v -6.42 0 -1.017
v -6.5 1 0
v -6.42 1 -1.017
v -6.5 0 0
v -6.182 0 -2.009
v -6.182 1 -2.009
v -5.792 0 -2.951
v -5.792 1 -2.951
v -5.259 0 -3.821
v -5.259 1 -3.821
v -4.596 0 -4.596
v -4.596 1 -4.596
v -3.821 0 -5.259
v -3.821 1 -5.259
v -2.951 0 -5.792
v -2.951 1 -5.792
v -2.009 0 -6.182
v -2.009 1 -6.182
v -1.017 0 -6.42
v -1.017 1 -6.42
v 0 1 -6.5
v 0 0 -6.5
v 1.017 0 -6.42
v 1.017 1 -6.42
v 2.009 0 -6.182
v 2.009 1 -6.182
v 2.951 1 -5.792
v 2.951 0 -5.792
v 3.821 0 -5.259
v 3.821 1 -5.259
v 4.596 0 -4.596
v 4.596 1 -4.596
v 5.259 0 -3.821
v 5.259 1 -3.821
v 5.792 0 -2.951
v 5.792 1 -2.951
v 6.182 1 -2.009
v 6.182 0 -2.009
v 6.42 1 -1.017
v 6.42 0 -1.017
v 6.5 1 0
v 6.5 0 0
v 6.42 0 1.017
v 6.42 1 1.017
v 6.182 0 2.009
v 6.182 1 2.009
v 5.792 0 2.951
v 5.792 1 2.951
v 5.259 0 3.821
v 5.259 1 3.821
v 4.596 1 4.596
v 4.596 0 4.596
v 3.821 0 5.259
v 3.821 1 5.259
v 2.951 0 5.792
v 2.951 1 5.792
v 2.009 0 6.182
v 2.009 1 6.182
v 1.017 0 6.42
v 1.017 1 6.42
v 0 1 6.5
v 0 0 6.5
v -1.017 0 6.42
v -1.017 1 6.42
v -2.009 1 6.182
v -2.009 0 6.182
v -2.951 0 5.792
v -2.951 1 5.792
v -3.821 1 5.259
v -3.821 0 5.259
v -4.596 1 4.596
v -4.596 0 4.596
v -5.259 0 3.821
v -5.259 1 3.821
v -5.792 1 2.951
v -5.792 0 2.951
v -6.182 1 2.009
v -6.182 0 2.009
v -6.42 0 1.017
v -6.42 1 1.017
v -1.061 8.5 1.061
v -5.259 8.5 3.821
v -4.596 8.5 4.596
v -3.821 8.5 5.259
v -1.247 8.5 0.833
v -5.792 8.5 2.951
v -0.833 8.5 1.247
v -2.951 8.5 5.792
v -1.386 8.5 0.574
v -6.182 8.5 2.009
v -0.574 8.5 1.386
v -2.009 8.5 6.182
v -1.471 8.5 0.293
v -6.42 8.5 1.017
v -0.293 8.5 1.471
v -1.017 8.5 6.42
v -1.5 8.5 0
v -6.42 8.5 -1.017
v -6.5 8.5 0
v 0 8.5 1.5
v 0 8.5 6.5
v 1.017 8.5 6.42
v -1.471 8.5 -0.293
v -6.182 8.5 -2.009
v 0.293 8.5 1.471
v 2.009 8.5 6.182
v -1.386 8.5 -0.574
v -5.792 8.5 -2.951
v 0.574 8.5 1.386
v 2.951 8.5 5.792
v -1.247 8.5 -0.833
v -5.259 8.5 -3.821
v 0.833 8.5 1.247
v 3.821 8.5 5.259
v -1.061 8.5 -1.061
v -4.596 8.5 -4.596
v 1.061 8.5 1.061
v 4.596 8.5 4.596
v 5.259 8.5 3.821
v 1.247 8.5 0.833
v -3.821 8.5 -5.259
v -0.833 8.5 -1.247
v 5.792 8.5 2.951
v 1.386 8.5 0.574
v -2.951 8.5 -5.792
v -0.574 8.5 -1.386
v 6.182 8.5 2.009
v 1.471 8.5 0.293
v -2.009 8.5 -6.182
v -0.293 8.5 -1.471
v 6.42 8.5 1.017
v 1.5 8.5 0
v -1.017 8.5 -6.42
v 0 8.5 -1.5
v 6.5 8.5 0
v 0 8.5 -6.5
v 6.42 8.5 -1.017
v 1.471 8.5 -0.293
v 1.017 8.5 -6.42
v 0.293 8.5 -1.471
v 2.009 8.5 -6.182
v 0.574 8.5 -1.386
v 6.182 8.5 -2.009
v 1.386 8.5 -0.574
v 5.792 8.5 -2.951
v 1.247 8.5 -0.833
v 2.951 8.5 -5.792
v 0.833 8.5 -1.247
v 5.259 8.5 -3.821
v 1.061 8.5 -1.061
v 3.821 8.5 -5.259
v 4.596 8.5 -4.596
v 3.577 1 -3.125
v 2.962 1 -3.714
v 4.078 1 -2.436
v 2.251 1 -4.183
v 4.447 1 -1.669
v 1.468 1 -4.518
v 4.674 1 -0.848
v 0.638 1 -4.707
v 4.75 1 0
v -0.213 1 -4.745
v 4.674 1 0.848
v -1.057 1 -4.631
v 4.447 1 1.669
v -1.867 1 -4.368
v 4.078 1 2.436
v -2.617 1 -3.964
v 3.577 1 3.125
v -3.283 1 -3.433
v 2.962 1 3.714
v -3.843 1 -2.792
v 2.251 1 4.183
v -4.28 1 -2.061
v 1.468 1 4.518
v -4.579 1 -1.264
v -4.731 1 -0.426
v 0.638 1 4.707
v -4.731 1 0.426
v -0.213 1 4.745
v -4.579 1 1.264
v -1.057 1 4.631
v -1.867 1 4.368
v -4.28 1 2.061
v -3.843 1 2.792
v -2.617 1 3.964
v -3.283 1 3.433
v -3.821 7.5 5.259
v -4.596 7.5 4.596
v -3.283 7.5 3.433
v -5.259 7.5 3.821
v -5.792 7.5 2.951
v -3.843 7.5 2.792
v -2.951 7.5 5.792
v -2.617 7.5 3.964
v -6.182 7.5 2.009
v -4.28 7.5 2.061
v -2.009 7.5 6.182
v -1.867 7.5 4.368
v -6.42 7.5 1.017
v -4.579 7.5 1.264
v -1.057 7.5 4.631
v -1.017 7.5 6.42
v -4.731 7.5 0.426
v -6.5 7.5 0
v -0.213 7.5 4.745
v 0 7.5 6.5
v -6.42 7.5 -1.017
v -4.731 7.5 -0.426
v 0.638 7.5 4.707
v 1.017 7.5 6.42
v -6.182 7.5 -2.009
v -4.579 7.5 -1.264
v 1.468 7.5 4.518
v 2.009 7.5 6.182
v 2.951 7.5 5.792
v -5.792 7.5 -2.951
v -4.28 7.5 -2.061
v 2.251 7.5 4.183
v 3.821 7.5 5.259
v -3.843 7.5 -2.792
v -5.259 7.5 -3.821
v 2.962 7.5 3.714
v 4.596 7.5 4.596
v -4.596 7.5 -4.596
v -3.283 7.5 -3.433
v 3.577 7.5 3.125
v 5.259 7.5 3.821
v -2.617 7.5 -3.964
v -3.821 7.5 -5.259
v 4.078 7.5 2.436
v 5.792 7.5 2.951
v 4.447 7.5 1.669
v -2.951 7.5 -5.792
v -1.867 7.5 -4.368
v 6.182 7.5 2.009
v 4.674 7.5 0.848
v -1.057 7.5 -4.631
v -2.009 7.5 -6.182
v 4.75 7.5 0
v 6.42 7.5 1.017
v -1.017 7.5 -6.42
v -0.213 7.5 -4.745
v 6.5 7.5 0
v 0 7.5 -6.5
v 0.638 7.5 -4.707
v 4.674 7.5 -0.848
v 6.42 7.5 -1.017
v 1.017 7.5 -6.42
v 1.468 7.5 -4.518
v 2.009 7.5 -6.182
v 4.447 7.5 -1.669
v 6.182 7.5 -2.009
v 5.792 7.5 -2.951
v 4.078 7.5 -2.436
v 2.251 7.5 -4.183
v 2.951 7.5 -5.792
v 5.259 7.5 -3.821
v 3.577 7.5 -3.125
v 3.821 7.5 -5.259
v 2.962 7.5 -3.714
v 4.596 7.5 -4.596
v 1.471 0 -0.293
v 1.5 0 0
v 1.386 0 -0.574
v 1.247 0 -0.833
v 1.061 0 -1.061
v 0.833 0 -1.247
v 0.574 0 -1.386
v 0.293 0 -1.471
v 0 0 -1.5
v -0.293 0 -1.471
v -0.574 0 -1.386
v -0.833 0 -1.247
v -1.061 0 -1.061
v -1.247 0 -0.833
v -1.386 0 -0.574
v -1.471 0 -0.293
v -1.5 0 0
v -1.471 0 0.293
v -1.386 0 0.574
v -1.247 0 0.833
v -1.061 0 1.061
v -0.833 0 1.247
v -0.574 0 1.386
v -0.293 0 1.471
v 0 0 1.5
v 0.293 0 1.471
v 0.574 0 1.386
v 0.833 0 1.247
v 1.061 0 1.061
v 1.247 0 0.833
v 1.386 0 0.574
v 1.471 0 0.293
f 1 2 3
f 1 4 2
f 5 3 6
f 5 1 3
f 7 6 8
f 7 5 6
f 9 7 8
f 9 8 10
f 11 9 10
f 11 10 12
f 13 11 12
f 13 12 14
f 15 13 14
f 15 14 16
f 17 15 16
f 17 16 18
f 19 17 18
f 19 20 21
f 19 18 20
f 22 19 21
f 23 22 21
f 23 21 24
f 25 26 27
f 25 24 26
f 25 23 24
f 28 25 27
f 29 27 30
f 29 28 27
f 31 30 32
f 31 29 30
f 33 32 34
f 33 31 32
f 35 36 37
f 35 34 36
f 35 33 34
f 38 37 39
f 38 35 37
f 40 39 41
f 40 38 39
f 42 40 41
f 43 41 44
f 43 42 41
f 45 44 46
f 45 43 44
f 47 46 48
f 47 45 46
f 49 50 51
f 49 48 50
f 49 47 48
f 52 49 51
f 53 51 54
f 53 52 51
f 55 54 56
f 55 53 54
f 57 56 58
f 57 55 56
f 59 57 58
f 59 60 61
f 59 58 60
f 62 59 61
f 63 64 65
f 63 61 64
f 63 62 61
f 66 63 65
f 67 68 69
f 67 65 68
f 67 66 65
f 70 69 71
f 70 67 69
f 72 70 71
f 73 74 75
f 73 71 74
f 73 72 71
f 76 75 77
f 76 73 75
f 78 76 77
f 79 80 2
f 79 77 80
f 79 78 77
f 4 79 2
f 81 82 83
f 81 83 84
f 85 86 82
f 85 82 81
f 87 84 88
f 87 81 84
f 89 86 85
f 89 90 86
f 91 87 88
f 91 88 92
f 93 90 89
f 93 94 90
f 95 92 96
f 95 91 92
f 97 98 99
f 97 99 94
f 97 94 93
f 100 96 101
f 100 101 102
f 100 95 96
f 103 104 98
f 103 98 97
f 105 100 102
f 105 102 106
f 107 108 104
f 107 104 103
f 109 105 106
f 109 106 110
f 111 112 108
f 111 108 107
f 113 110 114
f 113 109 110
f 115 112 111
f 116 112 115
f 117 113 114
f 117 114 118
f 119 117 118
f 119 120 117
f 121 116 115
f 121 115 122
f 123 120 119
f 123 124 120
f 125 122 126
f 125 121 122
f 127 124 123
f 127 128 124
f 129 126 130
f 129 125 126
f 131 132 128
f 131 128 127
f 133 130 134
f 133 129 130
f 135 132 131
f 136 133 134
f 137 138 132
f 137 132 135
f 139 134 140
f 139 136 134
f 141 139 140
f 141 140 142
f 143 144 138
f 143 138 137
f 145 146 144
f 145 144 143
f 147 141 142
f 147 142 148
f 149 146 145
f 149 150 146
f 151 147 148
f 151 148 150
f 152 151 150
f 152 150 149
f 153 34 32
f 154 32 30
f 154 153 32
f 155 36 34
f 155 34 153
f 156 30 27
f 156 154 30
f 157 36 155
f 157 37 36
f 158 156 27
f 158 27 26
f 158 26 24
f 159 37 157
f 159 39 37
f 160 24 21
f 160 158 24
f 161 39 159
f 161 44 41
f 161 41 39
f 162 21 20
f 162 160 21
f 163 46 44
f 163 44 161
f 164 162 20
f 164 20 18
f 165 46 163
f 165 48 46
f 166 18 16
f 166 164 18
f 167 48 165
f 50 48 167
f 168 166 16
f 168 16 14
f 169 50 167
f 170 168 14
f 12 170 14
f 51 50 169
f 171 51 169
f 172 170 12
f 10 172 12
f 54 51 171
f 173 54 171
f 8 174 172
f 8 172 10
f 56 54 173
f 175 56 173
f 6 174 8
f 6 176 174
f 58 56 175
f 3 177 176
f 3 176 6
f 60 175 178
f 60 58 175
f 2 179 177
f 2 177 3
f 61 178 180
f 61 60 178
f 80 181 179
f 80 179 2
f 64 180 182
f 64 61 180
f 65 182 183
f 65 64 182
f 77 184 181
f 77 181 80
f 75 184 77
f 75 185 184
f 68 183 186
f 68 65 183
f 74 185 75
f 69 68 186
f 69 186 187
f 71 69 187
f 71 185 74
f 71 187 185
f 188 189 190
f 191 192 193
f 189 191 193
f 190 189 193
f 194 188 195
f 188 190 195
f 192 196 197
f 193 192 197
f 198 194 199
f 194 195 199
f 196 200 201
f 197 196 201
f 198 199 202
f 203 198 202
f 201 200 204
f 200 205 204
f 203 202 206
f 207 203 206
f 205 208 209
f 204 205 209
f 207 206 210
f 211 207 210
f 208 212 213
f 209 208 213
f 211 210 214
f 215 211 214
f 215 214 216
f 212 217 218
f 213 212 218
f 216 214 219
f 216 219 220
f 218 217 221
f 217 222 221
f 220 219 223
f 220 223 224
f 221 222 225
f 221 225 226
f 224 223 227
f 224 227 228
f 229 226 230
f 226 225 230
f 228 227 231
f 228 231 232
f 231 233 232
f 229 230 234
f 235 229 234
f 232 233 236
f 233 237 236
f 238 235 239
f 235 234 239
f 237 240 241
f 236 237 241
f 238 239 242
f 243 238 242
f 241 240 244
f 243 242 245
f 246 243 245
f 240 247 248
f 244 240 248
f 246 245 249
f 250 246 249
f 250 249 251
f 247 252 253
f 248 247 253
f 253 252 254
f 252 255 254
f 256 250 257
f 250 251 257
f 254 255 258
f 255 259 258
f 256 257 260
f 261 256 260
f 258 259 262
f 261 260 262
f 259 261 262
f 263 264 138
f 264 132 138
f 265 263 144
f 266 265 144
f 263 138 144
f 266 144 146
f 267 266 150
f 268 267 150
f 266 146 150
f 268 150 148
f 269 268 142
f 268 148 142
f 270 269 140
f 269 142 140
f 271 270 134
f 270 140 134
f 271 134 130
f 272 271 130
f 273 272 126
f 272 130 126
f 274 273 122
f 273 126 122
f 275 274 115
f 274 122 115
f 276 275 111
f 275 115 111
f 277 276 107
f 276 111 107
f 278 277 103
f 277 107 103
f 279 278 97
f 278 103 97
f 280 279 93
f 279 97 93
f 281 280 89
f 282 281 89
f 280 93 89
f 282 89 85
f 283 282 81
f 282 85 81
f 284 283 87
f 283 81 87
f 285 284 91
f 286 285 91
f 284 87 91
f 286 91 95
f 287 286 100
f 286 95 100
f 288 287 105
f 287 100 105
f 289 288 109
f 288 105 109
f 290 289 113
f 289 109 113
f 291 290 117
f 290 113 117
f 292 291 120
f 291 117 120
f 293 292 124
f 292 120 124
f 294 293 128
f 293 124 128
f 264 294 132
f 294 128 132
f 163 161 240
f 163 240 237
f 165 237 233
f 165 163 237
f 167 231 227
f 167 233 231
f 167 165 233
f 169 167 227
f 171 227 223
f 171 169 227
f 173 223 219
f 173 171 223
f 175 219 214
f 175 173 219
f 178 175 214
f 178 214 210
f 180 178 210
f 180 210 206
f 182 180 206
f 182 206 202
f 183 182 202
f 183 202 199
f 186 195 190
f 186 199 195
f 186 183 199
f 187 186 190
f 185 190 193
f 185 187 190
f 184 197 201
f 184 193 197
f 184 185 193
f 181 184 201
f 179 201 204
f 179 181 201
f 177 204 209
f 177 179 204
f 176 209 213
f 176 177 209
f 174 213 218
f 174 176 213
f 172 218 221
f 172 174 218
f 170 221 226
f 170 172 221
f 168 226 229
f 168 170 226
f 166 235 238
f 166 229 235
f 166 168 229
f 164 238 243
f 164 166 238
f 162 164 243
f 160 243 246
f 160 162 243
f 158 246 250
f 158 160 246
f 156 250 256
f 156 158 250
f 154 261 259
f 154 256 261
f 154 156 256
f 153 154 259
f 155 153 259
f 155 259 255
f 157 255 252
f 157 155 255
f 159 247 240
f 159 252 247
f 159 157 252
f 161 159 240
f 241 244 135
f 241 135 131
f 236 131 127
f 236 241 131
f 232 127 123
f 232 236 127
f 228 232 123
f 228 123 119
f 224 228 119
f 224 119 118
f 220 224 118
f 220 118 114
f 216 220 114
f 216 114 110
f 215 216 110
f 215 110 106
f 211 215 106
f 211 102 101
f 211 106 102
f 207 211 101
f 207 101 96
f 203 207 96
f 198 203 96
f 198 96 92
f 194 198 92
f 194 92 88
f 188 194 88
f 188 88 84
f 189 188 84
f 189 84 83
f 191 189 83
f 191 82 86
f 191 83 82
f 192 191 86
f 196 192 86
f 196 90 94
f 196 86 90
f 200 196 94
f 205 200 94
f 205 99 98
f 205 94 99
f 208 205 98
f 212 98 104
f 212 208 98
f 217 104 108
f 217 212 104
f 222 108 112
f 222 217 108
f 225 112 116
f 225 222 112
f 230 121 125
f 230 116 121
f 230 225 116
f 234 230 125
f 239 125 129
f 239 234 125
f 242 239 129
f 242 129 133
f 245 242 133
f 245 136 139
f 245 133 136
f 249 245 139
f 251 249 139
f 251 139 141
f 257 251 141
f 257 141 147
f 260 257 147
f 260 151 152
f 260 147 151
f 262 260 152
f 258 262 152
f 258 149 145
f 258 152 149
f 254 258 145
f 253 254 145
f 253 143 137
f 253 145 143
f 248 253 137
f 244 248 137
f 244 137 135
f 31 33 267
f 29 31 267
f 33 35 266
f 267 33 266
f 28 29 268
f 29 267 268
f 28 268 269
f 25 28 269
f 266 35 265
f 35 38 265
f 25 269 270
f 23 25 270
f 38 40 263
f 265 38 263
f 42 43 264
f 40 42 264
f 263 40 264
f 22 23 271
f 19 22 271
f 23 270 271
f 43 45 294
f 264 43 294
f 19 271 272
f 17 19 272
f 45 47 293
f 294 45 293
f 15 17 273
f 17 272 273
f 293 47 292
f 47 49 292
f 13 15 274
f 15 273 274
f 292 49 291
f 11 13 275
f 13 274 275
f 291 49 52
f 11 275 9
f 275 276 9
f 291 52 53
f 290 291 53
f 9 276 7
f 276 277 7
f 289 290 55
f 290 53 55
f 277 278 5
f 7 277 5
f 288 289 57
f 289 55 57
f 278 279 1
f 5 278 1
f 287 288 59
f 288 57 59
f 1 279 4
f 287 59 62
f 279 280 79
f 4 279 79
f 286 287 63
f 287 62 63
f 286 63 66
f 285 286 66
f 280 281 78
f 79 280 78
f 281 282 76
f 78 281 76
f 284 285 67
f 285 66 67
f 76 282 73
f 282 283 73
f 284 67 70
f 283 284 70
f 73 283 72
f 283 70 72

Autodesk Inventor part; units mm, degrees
ref_plane "YZ Plane" through (0, 0, 0) normal (1, 0, 0) x (0, 1, 0)
ref_plane "XZ Plane" through (0, 0, 0) normal (0, 1, 0) x (-1, 0, 0)
ref_plane "XY Plane" through (0, 0, 0) normal (0, 0, 1) x (1, 0, 0)
sketch "Sketch1" plane through (0, 0, 0) normal (0, 1, 0) x (-1, 0, 0)
  circle A0 centre (0, 0) radius 6.5
  dimension "d0" = 13
extrude "Extrusion1" add sketch "Sketch1" along normal blind 1
sketch "Sketch2" plane through (0, 1, 0) normal (0, 1, 0) x (1, 0, 0)
  circle A0 centre (0, 0) radius 4.75
  dimension "d3" = 9.5
extrude "Extrusion2" add sketch "Sketch2" along normal blind 6.5
sketch "Sketch3" plane through (0, 7.5, 0) normal (0, 1, 0) x (1, 0, 0)
  circle A0 centre (0, 0) radius 4.75 projected
  circle A1 centre (0, 0) radius 6.5 projected
extrude "Extrusion3" add sketch "Sketch3" along normal blind 1 contours A0 | A1
sketch "Sketch4" plane through (0, 8.5, 0) normal (0, 1, 0) x (1, 0, 0)
  circle A0 centre (0, 0) radius 1.5
  dimension "d8" = 3
extrude "Extrusion4" cut sketch "Sketch4" against normal blind 10
properties part number "2GT_wheel1"
